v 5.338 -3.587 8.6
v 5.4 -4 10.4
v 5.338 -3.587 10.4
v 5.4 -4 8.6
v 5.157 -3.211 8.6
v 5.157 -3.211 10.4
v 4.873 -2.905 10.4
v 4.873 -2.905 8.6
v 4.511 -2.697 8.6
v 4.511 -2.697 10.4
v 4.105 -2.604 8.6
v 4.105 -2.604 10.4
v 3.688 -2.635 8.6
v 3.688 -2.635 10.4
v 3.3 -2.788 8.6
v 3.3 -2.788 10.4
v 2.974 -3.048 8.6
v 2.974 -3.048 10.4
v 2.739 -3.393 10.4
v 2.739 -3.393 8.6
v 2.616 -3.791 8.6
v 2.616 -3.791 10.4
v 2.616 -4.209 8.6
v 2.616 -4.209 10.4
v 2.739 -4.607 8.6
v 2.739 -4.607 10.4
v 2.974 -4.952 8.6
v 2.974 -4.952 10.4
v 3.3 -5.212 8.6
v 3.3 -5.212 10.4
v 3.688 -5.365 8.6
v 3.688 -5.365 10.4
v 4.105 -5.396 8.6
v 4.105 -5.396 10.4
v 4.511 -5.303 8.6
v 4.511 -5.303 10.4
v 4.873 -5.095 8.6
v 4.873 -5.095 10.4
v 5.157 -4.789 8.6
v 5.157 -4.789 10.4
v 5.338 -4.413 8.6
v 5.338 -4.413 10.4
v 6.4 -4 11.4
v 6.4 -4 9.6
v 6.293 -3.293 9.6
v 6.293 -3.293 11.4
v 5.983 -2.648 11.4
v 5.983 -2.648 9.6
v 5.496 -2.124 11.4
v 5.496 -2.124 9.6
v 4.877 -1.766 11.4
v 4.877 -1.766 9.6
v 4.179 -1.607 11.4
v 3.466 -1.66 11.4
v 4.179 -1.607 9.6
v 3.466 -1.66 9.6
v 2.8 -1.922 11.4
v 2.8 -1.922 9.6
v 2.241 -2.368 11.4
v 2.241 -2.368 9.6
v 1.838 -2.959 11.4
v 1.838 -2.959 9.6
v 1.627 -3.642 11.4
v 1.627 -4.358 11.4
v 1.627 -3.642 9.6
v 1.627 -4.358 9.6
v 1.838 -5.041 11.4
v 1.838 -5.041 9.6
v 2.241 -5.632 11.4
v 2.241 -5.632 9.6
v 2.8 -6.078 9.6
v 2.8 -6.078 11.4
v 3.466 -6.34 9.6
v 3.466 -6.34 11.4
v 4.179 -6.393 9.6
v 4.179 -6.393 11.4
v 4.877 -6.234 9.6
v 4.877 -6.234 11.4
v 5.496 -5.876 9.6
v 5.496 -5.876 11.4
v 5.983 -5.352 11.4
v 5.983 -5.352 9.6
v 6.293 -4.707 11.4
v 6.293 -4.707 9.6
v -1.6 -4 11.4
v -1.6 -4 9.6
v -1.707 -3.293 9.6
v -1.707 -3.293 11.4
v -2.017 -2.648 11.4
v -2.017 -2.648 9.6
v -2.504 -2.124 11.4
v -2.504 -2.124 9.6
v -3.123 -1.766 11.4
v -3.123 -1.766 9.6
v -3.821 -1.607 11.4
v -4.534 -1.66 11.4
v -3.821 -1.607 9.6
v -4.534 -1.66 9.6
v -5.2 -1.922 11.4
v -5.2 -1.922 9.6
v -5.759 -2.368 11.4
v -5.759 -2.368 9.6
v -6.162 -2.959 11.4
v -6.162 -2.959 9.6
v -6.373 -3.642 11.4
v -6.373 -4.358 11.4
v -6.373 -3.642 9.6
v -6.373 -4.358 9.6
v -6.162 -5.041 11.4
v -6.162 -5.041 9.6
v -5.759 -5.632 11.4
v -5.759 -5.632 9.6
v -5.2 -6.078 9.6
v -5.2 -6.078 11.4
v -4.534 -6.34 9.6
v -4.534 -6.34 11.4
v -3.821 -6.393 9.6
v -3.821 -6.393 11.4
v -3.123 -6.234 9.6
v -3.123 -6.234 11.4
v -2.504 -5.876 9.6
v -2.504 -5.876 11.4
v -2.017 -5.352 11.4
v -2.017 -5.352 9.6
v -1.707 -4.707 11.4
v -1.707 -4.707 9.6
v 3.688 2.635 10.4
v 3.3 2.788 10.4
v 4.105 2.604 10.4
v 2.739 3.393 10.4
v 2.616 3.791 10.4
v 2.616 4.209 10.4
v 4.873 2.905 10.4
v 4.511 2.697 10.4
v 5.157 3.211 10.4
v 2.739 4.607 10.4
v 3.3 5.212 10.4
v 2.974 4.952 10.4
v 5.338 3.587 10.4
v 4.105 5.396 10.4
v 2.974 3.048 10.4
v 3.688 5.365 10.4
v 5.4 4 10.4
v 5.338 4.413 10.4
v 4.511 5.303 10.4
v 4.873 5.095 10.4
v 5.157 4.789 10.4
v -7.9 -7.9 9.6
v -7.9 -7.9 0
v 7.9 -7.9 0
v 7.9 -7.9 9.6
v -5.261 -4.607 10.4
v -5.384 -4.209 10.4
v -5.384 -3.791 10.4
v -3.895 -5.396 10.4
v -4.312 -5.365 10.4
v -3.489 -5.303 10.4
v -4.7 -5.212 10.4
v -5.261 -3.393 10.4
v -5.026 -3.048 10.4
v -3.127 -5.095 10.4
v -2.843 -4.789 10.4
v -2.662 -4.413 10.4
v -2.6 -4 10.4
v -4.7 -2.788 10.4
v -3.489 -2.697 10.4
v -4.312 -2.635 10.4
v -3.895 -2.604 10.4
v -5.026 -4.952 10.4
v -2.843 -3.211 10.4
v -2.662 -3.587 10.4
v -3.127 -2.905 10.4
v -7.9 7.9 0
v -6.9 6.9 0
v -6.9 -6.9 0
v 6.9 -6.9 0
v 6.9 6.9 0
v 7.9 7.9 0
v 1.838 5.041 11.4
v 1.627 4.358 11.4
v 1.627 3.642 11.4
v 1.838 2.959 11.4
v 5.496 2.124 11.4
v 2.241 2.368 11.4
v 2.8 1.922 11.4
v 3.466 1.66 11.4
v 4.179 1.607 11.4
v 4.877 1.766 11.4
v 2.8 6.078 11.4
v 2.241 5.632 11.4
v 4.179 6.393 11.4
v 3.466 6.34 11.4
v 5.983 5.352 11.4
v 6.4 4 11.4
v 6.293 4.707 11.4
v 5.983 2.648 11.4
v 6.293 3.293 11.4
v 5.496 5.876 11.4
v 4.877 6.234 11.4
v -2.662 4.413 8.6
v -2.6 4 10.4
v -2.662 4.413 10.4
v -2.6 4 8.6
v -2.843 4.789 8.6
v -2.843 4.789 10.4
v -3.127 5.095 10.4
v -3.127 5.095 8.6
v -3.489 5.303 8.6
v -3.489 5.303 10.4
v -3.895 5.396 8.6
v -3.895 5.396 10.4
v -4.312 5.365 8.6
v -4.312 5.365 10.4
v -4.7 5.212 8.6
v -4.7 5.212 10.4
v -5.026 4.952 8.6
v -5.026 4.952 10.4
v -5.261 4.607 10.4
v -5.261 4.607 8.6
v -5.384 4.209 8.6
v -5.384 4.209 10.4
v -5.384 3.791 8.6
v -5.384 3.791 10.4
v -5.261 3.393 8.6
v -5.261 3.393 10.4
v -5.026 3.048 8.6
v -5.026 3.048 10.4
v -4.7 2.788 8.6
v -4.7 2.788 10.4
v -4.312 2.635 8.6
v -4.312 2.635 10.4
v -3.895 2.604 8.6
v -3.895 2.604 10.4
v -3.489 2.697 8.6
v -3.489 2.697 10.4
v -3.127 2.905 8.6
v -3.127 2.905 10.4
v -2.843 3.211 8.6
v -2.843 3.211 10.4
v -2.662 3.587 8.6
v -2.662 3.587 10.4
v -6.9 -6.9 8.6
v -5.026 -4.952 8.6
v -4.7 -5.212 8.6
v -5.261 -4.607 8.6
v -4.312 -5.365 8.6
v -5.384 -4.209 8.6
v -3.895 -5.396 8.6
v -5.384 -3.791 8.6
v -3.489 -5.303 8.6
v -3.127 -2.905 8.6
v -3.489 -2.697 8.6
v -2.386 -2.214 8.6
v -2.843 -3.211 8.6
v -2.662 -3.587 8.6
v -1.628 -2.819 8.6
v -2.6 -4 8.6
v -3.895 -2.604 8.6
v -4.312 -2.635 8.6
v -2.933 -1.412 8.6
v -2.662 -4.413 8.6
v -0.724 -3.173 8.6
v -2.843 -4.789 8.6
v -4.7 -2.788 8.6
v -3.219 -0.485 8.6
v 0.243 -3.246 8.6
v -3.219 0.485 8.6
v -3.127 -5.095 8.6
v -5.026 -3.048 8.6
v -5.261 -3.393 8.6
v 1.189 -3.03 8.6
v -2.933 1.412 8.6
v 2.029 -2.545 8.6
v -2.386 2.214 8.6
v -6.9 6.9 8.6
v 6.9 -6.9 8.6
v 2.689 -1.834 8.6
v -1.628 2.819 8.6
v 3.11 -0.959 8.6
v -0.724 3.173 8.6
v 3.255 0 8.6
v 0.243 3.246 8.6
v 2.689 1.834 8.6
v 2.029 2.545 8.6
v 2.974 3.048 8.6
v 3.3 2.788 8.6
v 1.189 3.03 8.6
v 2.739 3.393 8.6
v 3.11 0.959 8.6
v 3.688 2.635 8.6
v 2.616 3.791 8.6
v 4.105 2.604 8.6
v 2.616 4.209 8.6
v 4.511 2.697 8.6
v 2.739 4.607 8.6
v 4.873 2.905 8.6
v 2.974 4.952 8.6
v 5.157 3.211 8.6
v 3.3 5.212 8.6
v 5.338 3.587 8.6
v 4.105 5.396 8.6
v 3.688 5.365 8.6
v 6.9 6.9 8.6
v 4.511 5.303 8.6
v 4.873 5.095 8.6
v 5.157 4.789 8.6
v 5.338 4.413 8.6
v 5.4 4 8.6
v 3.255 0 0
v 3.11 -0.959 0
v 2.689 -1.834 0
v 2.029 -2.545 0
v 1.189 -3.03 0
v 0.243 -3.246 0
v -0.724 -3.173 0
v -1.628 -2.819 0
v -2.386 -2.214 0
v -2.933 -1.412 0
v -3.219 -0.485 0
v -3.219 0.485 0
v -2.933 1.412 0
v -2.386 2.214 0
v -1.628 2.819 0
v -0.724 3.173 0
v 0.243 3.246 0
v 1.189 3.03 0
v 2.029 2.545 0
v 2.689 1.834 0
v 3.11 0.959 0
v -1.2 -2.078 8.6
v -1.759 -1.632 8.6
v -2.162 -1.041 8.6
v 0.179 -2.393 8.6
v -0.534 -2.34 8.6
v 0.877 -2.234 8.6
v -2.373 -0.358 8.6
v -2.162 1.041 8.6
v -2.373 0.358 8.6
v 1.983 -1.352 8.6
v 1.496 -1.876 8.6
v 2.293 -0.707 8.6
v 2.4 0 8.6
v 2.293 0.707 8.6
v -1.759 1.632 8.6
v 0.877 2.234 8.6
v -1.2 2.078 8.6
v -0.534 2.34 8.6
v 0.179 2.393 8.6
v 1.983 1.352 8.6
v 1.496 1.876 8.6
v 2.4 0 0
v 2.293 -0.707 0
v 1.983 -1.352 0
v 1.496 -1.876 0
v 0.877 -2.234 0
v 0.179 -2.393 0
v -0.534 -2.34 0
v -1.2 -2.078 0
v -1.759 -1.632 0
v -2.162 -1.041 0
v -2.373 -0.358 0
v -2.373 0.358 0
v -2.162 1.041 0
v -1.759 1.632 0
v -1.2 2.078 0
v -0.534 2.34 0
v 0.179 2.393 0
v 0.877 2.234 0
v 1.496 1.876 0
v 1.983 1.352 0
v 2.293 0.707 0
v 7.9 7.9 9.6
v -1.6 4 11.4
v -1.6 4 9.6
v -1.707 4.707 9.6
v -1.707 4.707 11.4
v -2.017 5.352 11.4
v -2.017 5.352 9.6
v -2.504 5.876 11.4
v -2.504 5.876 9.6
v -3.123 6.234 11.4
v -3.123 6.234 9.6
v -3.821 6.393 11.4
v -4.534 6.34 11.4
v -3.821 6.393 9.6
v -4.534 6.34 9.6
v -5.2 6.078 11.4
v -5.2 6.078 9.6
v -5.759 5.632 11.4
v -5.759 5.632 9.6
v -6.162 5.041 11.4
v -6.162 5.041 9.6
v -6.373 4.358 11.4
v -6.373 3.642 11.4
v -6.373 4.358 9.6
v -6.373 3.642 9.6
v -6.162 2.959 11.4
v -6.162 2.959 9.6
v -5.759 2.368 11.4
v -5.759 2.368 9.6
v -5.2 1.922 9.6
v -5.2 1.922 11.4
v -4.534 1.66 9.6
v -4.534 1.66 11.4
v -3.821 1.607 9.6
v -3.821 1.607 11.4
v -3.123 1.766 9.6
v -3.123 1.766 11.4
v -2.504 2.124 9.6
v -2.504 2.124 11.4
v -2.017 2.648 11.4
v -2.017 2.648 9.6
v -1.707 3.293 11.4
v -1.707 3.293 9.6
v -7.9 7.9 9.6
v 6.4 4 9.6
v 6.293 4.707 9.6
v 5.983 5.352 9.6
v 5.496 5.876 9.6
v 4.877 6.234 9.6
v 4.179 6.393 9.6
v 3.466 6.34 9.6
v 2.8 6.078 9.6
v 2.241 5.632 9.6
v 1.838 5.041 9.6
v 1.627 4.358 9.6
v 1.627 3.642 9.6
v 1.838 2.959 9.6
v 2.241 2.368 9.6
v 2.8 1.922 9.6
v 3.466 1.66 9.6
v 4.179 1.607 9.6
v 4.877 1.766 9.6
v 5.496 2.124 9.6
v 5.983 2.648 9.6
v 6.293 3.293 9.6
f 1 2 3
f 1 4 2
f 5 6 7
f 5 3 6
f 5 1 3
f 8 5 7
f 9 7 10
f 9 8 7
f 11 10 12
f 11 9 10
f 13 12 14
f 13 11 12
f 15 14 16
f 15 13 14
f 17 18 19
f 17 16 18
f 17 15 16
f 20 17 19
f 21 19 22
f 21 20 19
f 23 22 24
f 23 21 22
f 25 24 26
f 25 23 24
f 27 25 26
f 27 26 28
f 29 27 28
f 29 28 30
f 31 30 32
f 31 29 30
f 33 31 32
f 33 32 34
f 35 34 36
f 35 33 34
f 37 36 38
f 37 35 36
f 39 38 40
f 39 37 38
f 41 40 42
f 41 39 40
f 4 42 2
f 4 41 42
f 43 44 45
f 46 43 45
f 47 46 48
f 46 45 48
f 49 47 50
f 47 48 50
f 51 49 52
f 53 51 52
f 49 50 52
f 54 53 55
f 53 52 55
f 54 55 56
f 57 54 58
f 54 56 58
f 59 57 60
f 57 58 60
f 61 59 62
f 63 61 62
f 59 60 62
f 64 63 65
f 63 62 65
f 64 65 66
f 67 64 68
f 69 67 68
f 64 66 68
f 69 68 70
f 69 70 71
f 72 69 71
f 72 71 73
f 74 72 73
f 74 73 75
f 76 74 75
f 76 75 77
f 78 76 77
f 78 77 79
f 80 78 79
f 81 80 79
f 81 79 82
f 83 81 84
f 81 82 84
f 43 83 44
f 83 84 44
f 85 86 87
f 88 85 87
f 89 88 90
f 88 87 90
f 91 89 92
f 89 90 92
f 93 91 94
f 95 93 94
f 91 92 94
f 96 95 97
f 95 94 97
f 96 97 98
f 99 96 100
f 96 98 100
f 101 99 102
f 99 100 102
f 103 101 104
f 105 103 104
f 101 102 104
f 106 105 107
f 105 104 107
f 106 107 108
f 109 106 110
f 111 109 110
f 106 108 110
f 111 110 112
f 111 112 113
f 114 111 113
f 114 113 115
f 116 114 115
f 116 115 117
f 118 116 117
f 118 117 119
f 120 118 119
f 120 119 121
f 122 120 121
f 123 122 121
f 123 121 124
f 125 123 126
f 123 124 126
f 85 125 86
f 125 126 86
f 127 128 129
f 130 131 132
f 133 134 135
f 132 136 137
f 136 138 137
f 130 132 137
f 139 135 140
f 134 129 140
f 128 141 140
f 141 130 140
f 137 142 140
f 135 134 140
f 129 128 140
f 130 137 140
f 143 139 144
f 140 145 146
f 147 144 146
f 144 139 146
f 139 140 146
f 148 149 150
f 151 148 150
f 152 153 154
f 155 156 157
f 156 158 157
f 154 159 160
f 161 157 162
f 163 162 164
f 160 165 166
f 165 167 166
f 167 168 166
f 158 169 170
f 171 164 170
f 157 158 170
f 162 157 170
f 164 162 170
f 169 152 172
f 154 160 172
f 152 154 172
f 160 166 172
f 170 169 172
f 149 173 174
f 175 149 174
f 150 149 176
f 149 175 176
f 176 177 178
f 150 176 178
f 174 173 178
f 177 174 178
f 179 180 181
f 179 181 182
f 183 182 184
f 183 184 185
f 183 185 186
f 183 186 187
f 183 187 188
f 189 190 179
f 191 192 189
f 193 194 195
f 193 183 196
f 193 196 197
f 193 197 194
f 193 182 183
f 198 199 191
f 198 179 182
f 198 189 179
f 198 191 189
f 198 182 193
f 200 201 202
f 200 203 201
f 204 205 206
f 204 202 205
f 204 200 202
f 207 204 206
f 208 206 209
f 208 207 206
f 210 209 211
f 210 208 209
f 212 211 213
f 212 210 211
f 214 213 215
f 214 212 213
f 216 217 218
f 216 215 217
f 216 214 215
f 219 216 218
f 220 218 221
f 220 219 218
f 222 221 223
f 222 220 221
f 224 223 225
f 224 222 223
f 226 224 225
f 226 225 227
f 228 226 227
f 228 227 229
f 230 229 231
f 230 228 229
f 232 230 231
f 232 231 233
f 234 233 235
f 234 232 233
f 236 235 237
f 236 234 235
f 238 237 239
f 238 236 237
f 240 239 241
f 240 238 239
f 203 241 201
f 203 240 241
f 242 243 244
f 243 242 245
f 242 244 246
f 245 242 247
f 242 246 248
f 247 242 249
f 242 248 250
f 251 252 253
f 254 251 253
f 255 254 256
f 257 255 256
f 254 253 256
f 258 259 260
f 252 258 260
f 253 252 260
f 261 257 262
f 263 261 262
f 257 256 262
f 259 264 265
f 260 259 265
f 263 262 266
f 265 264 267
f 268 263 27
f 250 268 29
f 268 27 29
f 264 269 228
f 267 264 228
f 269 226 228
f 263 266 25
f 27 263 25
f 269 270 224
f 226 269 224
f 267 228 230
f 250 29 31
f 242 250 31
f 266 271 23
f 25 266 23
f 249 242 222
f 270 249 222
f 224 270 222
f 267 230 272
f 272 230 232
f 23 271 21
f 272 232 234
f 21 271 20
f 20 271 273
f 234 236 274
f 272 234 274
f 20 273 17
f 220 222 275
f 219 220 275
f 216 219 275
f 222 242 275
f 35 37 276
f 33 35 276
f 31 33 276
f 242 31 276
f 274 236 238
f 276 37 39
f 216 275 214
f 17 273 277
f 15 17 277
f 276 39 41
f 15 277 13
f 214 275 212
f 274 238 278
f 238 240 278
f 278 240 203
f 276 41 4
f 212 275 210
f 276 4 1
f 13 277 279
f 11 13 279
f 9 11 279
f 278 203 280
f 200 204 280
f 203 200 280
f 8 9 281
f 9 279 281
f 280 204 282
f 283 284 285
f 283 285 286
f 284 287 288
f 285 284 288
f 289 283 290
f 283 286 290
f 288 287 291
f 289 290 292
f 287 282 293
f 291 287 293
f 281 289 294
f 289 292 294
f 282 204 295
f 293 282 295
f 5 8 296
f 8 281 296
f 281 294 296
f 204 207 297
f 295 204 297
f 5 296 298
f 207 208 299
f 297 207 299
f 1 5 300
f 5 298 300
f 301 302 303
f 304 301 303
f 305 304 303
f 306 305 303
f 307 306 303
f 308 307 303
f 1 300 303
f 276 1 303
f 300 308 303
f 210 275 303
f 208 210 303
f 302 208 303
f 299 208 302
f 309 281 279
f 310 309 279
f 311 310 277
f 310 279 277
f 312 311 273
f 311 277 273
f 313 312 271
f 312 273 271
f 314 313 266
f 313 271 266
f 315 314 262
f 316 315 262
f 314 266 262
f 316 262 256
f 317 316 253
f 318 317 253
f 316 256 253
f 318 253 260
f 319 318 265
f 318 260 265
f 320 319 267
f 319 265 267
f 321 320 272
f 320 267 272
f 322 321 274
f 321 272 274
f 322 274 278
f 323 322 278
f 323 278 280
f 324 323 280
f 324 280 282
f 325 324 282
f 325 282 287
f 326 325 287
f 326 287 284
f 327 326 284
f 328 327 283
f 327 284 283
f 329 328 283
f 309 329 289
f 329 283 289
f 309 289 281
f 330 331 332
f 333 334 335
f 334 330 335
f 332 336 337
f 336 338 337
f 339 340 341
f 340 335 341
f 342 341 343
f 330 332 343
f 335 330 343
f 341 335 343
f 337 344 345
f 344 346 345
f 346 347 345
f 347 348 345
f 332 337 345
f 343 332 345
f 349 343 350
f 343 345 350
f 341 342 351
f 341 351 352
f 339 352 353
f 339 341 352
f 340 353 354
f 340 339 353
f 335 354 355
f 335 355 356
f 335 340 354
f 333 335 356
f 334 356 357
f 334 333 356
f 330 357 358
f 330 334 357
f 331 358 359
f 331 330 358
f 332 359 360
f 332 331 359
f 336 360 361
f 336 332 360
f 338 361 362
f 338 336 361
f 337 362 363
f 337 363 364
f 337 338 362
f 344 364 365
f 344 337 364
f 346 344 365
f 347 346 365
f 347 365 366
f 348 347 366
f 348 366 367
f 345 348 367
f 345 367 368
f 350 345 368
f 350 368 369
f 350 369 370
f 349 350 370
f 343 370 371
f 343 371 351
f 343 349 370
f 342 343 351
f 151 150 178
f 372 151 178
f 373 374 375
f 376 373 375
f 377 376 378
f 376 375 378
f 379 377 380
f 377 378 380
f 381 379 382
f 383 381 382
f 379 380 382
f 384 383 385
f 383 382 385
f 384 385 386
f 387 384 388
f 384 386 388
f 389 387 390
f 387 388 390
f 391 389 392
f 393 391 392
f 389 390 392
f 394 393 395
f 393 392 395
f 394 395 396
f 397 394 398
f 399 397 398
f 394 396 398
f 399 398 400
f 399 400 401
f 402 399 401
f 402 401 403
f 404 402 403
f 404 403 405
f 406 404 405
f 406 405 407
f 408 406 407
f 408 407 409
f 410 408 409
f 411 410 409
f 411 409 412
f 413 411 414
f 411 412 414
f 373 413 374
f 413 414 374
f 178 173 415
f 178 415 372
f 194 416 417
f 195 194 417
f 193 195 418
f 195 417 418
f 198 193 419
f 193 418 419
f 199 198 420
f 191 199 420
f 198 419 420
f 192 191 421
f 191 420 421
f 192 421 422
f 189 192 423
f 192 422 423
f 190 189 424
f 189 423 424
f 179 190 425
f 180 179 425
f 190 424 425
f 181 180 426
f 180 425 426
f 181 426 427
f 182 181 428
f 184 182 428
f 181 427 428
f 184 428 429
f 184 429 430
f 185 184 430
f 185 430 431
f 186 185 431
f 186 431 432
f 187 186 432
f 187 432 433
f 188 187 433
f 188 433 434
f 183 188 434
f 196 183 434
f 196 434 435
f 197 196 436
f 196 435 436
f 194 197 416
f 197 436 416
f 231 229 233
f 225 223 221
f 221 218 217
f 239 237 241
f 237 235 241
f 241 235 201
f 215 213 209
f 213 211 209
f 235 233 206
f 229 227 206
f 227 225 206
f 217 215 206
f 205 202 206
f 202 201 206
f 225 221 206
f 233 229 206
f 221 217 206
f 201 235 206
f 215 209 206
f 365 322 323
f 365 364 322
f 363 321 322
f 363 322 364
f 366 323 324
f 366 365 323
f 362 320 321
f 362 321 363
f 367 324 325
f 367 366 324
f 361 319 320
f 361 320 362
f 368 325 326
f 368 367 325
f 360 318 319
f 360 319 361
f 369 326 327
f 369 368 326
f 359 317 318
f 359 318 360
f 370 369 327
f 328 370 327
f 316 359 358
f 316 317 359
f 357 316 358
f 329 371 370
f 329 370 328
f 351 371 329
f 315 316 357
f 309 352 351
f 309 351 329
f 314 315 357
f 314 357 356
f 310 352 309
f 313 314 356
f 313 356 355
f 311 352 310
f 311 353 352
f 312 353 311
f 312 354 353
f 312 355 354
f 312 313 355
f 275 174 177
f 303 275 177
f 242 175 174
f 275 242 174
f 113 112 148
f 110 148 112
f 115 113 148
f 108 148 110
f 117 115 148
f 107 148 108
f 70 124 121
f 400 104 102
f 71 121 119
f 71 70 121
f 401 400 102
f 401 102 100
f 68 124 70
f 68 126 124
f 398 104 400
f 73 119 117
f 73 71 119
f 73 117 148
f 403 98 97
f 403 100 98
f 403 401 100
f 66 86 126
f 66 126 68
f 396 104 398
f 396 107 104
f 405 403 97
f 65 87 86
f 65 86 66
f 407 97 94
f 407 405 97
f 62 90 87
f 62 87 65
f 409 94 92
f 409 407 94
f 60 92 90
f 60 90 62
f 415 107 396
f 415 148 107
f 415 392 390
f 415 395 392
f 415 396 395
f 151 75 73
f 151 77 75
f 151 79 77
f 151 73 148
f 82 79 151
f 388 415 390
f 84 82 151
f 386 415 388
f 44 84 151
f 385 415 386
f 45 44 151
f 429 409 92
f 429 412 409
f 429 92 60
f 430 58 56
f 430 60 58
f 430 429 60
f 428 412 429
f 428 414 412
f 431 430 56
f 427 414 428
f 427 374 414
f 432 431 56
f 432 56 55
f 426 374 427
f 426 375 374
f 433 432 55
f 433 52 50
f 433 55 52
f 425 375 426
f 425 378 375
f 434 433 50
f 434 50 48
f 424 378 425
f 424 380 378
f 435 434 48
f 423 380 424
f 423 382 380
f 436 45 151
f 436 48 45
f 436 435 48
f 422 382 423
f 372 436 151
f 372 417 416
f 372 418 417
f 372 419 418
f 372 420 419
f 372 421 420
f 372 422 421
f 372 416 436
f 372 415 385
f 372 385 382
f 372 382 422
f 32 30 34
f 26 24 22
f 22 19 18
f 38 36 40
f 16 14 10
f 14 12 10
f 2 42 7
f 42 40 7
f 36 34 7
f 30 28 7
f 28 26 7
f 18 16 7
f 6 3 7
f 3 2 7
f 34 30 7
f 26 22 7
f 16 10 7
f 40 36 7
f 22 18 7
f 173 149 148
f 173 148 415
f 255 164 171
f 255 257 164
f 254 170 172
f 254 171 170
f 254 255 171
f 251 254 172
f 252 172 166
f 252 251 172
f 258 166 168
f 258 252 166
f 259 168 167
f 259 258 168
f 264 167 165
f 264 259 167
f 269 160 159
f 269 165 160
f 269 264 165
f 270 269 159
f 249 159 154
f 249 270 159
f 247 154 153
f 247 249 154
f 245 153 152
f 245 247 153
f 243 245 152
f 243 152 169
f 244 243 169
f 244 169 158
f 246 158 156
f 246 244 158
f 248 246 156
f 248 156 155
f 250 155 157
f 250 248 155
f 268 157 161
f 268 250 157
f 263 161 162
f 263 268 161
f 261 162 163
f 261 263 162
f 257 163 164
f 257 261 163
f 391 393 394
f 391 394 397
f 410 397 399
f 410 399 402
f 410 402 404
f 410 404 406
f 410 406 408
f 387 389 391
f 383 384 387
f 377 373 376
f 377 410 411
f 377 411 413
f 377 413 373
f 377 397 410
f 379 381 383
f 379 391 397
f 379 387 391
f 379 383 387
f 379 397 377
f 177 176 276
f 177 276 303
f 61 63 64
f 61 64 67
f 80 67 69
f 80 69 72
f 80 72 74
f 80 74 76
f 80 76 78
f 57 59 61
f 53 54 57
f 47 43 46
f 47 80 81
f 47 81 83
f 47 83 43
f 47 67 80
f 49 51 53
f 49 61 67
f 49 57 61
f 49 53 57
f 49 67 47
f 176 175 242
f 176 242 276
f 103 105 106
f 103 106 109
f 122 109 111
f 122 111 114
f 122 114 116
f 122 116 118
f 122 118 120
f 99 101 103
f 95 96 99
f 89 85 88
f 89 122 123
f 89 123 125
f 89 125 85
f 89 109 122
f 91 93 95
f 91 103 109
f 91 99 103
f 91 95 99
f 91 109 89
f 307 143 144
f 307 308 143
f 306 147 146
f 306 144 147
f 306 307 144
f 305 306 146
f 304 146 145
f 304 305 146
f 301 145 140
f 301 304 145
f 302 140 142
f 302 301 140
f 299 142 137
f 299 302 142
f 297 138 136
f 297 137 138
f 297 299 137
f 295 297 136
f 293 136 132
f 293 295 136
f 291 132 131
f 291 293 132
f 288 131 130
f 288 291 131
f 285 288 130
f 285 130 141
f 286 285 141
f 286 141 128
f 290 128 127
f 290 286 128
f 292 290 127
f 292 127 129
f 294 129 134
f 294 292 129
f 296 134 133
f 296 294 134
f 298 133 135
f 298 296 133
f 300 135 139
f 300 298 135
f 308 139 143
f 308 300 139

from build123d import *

# Parameters (mm, degrees)
F0_W     = 15.8
F0_H     = 15.8
F1_DEPTH = 9.6
F2_R     = 2.4
F3_DEPTH = 1.8
F4_T     = -1
F5_R     = 3.255
F5_R_2   = 2.4
F6_DEPTH = 8.6


with BuildPart() as f1:
    # F0 (on Top) → F1 (new body)
    with BuildSketch(Plane.XY):
        Rectangle(F0_W, F0_H)
    extrude(amount=F1_DEPTH)

    # F2 (on face) → F3 (join)
    with BuildSketch(Plane.XY.offset(9.6)):
        with Locations((-4, 4)):
            Circle(F2_R)
        with Locations((4, 4)):
            Circle(F2_R)
        with Locations((4, -4)):
            Circle(F2_R)
        with Locations((-4, -4)):
            Circle(F2_R)
    extrude(amount=F3_DEPTH)

    # F4
    f4_openings = [f1.faces().sort_by_distance(p)[0] for p in [
        (0, 0, 0),
    ]]
    offset(amount=F4_T, openings=f4_openings, kind=Kind.INTERSECTION)

    # F5 (on face) → F6 (join, through all)
    with BuildSketch(Plane(origin=(0, 0, 8.6), x_dir=(1, 0, 0), z_dir=(0, 0, -1))):
        Circle(F5_R)
        Circle(F5_R_2, mode=Mode.SUBTRACT)
    extrude(amount=F6_DEPTH)


solid = f1.part
